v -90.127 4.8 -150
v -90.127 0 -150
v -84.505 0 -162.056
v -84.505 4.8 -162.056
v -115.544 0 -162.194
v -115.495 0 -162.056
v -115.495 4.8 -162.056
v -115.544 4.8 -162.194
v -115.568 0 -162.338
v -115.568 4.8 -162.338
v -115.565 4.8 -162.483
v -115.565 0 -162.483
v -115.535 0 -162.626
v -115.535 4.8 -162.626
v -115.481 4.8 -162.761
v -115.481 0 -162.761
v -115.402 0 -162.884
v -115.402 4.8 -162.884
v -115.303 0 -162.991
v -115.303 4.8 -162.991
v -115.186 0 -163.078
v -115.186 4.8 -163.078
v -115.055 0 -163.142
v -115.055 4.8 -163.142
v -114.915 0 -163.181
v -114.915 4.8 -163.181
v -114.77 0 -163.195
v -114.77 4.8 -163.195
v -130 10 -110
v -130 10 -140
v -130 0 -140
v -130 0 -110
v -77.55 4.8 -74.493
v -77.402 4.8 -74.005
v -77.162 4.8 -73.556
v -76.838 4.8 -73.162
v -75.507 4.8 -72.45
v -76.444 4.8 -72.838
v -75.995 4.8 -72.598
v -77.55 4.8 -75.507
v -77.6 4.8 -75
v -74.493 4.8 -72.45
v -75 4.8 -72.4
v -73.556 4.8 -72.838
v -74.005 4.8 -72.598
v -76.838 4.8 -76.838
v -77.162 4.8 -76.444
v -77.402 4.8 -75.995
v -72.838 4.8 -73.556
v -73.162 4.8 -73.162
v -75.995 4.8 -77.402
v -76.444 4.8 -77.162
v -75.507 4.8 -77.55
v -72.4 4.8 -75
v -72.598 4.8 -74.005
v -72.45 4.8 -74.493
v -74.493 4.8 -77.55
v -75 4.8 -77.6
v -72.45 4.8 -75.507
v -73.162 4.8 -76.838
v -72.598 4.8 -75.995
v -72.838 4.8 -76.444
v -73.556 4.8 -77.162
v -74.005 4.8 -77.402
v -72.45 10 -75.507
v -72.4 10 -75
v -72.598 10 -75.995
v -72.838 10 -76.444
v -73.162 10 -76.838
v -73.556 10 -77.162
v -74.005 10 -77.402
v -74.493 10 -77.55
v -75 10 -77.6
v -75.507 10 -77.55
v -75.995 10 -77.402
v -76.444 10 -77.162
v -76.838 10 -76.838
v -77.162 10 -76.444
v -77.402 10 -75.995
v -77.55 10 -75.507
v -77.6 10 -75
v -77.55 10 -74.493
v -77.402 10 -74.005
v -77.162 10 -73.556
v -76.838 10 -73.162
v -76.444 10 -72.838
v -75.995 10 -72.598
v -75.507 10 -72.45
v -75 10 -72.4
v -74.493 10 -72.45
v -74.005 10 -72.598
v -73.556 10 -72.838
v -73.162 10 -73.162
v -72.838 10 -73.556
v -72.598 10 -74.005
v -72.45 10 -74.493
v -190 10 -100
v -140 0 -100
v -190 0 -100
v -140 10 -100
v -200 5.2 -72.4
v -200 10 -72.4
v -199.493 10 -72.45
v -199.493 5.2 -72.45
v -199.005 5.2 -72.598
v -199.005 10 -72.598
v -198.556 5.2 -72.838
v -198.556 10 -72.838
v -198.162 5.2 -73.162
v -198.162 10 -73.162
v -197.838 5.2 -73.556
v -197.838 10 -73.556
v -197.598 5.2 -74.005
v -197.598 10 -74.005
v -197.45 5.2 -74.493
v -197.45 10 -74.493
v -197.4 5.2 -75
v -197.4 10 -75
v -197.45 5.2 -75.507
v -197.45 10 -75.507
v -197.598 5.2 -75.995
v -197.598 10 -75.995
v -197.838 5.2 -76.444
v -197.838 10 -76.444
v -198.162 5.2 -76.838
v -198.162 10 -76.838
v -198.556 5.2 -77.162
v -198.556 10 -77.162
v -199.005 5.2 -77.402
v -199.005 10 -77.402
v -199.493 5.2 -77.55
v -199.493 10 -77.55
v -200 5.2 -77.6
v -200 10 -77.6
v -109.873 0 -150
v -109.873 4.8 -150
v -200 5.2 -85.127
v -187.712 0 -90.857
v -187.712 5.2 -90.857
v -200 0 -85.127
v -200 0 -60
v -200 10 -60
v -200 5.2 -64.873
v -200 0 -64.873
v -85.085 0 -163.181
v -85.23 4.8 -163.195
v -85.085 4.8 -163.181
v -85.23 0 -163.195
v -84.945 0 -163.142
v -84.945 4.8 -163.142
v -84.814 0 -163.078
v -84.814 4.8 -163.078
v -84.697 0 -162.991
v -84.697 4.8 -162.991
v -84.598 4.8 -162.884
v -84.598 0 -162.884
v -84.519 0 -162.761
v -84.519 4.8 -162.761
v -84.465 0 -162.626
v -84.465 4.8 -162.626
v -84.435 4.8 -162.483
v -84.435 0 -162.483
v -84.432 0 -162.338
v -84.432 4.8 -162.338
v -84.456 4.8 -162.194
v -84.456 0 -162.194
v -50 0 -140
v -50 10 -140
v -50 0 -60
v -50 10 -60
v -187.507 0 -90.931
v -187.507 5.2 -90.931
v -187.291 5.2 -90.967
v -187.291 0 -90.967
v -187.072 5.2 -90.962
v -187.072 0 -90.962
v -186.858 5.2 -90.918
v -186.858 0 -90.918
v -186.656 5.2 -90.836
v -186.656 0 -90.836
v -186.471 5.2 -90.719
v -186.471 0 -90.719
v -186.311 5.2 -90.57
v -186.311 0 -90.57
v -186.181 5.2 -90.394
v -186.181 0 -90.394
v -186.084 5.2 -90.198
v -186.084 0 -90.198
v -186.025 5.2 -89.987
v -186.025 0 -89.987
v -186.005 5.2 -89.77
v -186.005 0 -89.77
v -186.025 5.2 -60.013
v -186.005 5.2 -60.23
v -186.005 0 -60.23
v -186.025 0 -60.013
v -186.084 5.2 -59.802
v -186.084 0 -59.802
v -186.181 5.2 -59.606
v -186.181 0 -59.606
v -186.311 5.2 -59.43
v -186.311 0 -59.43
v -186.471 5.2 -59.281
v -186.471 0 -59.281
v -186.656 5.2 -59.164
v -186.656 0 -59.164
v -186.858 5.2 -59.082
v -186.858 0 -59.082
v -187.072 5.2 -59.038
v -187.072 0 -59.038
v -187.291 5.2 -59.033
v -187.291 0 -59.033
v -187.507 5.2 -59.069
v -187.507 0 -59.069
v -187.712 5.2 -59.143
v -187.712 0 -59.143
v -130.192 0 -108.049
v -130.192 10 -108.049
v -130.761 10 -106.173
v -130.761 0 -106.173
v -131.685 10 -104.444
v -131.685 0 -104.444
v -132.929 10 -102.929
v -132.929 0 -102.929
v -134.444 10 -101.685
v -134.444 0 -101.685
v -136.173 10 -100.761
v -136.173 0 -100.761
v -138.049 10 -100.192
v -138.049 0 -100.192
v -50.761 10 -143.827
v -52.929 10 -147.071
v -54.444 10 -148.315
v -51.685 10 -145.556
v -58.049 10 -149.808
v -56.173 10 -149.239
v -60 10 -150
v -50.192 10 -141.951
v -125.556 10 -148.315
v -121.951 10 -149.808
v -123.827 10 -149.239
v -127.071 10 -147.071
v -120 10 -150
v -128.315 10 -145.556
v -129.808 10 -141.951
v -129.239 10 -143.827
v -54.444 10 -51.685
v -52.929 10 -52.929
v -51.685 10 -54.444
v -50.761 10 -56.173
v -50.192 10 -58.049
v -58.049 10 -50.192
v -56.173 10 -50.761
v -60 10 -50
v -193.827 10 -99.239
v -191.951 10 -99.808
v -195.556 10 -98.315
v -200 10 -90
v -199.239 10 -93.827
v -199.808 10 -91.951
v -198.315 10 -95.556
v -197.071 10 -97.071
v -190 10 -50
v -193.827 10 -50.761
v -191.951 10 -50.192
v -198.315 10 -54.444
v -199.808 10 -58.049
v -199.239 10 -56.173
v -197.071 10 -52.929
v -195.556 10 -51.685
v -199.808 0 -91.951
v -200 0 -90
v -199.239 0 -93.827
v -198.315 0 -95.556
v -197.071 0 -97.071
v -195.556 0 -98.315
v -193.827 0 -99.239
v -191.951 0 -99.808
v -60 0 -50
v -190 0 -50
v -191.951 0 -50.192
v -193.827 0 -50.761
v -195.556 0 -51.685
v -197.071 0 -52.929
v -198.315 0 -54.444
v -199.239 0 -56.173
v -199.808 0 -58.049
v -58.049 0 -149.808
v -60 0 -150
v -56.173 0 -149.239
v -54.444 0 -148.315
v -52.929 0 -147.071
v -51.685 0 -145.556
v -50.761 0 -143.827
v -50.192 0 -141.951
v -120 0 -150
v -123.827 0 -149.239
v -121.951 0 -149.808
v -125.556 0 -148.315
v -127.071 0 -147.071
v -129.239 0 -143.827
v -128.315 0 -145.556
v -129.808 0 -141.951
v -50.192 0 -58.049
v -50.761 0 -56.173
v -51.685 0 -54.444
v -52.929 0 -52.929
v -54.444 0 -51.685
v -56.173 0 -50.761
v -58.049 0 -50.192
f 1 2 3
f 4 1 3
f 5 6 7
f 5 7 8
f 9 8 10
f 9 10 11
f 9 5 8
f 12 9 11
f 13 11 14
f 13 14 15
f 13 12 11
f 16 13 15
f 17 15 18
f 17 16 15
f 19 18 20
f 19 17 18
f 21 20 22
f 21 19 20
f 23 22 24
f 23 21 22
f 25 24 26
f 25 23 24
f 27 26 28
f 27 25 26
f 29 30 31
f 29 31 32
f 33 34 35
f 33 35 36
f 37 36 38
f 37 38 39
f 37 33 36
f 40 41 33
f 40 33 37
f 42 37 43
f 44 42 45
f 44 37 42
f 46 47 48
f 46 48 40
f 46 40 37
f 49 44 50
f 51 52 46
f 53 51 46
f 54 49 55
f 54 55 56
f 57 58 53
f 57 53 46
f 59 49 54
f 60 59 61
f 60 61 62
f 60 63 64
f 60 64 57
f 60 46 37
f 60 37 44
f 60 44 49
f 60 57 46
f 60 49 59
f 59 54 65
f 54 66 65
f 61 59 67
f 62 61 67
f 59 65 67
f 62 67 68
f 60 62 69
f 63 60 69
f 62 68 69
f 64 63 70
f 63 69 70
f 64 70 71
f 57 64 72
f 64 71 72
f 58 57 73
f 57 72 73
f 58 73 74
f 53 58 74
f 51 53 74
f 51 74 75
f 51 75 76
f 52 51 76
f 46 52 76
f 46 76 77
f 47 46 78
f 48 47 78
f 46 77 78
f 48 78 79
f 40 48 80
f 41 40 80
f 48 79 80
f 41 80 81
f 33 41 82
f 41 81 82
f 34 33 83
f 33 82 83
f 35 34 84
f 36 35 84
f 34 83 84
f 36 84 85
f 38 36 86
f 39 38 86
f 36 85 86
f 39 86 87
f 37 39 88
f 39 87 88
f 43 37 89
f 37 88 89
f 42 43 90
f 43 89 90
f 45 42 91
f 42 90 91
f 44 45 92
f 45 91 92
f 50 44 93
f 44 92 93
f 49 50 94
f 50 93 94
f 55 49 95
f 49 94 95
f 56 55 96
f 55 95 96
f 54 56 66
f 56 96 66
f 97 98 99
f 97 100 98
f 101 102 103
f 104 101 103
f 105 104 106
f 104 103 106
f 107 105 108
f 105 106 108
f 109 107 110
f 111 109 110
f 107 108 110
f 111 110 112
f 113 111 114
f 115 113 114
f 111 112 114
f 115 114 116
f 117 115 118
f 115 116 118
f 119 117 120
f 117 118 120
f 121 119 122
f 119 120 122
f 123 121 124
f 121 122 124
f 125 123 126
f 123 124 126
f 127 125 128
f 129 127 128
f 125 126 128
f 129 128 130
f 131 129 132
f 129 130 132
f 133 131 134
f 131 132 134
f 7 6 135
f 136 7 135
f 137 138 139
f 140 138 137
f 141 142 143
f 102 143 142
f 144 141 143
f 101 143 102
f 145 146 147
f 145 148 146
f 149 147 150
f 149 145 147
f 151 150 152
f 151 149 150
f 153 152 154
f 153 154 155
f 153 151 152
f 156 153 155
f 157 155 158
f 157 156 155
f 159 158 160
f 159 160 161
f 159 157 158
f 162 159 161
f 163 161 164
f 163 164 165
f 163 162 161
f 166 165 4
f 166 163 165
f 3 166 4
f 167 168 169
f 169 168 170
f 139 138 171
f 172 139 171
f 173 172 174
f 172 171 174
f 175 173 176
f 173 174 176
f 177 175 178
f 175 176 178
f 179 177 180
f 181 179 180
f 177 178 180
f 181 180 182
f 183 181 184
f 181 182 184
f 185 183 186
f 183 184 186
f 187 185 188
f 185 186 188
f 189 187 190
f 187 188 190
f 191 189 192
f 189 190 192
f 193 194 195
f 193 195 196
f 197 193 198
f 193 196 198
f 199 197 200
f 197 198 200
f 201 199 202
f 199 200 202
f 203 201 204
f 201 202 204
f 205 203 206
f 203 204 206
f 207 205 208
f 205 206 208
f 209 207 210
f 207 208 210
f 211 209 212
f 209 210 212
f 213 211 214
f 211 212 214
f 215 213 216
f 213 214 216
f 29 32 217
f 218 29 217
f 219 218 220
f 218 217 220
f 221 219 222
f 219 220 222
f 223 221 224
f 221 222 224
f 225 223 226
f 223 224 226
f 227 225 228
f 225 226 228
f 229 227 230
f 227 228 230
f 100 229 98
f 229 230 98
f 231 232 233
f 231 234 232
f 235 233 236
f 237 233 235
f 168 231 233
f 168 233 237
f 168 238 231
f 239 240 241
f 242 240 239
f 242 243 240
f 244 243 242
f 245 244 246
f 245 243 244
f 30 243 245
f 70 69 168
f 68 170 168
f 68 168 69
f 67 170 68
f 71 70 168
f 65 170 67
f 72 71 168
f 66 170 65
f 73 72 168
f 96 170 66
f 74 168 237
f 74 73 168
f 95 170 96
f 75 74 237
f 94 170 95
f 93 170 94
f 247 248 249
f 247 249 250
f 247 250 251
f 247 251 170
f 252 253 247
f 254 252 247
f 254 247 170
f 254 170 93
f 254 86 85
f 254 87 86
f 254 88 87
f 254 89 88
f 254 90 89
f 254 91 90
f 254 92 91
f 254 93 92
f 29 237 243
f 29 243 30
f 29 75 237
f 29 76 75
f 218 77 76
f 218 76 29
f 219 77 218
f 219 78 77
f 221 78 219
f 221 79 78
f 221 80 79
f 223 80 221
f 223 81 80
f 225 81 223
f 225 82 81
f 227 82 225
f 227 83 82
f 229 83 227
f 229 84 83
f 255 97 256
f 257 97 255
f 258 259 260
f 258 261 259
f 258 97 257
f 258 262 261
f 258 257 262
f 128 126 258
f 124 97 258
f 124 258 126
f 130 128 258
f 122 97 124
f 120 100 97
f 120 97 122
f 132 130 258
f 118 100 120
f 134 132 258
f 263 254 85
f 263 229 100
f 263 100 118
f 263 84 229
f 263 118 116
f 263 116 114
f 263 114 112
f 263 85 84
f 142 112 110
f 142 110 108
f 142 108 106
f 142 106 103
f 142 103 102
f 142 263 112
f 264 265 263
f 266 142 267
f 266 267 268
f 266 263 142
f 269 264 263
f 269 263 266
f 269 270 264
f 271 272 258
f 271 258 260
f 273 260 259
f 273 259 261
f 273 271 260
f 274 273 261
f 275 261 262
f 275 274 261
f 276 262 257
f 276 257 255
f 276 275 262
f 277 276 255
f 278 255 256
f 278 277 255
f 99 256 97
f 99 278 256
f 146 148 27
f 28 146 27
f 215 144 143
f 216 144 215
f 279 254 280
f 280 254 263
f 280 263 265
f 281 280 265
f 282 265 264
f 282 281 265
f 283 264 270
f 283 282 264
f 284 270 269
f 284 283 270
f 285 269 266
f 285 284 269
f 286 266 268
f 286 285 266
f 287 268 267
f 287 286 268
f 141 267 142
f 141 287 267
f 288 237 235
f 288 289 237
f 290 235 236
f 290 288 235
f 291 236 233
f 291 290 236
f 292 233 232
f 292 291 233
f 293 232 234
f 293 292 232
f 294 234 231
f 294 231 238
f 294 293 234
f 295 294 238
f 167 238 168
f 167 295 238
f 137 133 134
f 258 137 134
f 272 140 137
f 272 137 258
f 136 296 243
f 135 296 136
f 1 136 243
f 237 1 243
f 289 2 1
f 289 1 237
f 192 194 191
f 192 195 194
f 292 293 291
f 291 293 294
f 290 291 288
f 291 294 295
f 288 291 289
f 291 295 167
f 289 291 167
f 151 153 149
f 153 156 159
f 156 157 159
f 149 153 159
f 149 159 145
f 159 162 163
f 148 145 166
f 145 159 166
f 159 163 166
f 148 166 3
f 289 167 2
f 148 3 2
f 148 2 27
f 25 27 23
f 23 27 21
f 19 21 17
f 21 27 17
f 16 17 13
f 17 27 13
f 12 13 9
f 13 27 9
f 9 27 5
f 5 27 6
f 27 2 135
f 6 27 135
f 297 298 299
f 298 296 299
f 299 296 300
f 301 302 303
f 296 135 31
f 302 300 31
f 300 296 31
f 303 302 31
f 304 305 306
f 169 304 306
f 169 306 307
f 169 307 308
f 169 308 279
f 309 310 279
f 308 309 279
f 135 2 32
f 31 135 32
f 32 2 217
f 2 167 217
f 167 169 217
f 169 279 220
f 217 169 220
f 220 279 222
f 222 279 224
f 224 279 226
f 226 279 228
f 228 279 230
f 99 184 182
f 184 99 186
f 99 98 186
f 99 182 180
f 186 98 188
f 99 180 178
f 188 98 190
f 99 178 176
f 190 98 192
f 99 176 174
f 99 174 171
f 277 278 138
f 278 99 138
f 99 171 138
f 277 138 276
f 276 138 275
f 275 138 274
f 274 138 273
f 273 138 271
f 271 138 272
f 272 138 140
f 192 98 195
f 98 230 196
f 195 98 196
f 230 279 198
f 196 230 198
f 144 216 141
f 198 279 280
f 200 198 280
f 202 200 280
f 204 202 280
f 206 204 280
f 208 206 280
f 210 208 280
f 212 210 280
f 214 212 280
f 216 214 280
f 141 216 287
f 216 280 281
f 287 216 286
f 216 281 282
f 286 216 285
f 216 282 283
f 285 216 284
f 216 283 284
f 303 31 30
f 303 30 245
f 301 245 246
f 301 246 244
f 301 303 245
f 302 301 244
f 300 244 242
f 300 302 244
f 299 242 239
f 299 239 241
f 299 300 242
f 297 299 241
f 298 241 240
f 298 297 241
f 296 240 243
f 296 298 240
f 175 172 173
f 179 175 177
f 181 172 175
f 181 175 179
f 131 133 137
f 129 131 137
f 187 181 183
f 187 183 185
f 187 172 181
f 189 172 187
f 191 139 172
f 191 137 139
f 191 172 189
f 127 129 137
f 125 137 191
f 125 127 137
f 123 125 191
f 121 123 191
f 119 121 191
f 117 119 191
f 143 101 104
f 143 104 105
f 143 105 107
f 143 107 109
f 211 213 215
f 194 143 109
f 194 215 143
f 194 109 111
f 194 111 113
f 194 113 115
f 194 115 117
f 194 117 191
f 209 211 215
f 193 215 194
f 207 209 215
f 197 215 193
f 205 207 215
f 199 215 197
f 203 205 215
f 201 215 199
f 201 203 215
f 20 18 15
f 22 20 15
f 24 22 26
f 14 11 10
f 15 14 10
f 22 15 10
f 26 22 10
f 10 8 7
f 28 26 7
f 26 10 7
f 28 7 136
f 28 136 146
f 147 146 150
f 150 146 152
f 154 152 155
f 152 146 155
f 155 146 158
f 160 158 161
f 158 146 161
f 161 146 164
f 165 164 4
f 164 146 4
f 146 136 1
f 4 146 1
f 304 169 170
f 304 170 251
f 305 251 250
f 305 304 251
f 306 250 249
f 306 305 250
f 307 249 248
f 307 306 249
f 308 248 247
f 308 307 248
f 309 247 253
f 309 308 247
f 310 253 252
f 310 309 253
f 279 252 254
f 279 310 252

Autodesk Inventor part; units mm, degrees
ref_plane "YZ Plane" through (0, 0, 0) normal (1, 0, 0) x (0, 1, 0)
ref_plane "XZ Plane" through (0, 0, 0) normal (0, 1, 0) x (-1, 0, 0)
ref_plane "XY Plane" through (0, 0, 0) normal (0, 0, 1) x (1, 0, 0)
sketch "Sketch1" plane through (0, 0, 0) normal (0, 1, 0) x (-1, 0, 0)
  line L0 (0, 0) -> (200, 0)
  line L1 (200, 0) -> (200, -150)
  line L2 (200, -150) -> (0, -150)
  line L3 (0, -150) -> (0, 0)
  dimension "d0" = 200
  dimension "d1" = 150
extrude "Extrusion1" add sketch "Sketch1" along normal blind 10
sketch "Sketch2" plane through (0, 0, 0) normal (0, -1, 0) x (1, 0, 0)
  line L0 (-199.8, -85) -> (-186.3697, -85) construction
  line L1 (-187.7125, -90.8572) -> (-200, -85.1274)
  line L2 (-200, -85.1274) -> (-200, -64.8726)
  line L3 (-200, -64.8726) -> (-187.7125, -59.1428)
  arc A0 (-186.0054, -60.2304) -> (-187.7125, -59.1428) centre (-187.2054, -60.2304) ccw
  line L4 (-186.0054, -60.2304) -> (-186.0054, -75)
  line L5 (-186.0054, -75) -> (-186.0054, -89.7696)
  arc A1 (-187.7125, -90.8572) -> (-186.0054, -89.7696) centre (-187.2054, -89.7696) ccw
  line L6 (-200, -150) -> (-200, 0) projected
  point P0 (0, 0)
  point P1 (-186.2054, -91.3393)
  point P2 (-200, -75)
  point P3 (-200, -75)
  dimension "d4" = 15
extrude "Extrusion2" cut sketch "Sketch2" against normal blind 5.2
sketch "Sketch3" plane through (0, 0, 0) normal (0, -1, 0) x (1, 0, 0)
  line L0 (-110, -149.8) -> (-110, -163.2303) construction
  line L1 (-100, -163.1946) -> (-114.7696, -163.1946)
  arc A0 (-115.4946, -162.0565) -> (-114.7696, -163.1946) centre (-114.7696, -162.3946) ccw
  line L2 (-115.4946, -162.0565) -> (-109.8726, -150)
  line L3 (-109.8726, -150) -> (-90.1274, -150)
  line L4 (-90.1274, -150) -> (-84.5054, -162.0565)
  arc A1 (-85.2304, -163.1946) -> (-84.5054, -162.0565) centre (-85.2304, -162.3946) ccw
  line L5 (-85.2304, -163.1946) -> (-100, -163.1946)
  line L6 (0, -150) -> (-200, -150) projected
  point P0 (0, 0)
  point P1 (-100, -150)
  point P2 (-100, -150)
  point P3 (-100, -150)
extrude "Extrusion3" add sketch "Sketch3" against normal blind 4.8
sketch "Sketch4" plane through (0, 10, 0) normal (0, 1, 0) x (1, 0, 0)
  line L0 (-200, 85.1274) -> (-200, 64.8726) projected
  line L1 (0, 0) -> (0, 150) projected
  line L2 (0, 75) -> (-75, 75)
  circle A0 centre (-200, 75) radius 2.6
  circle A1 centre (-75, 75) radius 2.6
  dimension "d12" = 75
  dimension "d13" = 5.2
  dimension "d14" = 5.2
extrude "Extrusion4" cut sketch "Sketch4" against normal blind 5.2
sketch "Sketch5" plane through (0, 10, 0) normal (0, 1, 0) x (1, 0, 0)
  line L0 (-200, 0) -> (0, 0) projected
  line L1 (0, 150) -> (-50, 150)
  line L2 (-50, 150) -> (-50, 0)
  line L3 (-50, 0) -> (0, 0)
  line L4 (0, 0) -> (0, 150)
  line L5 (-200, 0) -> (0, 0)
  line L6 (0, 0) -> (0, 50)
  line L7 (0, 50) -> (-200, 50)
  line L8 (-200, 50) -> (-200, 0)
  line L9 (-200, 150) -> (-130, 150)
  line L10 (-130, 150) -> (-130, 100)
  line L11 (-130, 100) -> (-200, 100)
  line L12 (-200, 100) -> (-200, 150)
  point P0 (-50, 50)
  dimension "d17" = 50
  dimension "d18" = 50
  dimension "d19" = 70
  dimension "d20" = 50
extrude "Extrusion5" cut sketch "Sketch5" against normal blind 15
fillet "Fillet1" radius 10 6 edges at (-50, 5, -150) (-130, 5, -150) (-200, 5, -100) (-130, 5, -100) (-200, 5, -50) (-50, 5, -50)
properties part number "Area nh"
